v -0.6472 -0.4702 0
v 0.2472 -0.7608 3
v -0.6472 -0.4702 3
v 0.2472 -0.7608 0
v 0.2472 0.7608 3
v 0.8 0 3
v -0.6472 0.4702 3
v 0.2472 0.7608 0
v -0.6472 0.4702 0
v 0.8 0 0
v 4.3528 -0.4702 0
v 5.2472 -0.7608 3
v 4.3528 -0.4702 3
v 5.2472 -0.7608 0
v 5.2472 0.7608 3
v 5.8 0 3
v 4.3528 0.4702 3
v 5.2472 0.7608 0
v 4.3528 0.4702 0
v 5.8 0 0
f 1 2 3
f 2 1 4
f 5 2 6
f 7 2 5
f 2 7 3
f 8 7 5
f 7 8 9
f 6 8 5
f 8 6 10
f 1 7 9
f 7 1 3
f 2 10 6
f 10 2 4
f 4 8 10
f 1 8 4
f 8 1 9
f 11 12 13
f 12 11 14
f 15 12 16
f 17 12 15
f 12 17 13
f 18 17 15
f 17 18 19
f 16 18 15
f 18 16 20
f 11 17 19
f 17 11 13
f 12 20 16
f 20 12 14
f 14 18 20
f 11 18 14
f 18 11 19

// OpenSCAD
union() {
  translate([0, 0, 0]) cylinder(h=3, r=0.8, center=false);
  translate([5, 0, 0]) cylinder(h=3, r=0.8, center=false);
}
